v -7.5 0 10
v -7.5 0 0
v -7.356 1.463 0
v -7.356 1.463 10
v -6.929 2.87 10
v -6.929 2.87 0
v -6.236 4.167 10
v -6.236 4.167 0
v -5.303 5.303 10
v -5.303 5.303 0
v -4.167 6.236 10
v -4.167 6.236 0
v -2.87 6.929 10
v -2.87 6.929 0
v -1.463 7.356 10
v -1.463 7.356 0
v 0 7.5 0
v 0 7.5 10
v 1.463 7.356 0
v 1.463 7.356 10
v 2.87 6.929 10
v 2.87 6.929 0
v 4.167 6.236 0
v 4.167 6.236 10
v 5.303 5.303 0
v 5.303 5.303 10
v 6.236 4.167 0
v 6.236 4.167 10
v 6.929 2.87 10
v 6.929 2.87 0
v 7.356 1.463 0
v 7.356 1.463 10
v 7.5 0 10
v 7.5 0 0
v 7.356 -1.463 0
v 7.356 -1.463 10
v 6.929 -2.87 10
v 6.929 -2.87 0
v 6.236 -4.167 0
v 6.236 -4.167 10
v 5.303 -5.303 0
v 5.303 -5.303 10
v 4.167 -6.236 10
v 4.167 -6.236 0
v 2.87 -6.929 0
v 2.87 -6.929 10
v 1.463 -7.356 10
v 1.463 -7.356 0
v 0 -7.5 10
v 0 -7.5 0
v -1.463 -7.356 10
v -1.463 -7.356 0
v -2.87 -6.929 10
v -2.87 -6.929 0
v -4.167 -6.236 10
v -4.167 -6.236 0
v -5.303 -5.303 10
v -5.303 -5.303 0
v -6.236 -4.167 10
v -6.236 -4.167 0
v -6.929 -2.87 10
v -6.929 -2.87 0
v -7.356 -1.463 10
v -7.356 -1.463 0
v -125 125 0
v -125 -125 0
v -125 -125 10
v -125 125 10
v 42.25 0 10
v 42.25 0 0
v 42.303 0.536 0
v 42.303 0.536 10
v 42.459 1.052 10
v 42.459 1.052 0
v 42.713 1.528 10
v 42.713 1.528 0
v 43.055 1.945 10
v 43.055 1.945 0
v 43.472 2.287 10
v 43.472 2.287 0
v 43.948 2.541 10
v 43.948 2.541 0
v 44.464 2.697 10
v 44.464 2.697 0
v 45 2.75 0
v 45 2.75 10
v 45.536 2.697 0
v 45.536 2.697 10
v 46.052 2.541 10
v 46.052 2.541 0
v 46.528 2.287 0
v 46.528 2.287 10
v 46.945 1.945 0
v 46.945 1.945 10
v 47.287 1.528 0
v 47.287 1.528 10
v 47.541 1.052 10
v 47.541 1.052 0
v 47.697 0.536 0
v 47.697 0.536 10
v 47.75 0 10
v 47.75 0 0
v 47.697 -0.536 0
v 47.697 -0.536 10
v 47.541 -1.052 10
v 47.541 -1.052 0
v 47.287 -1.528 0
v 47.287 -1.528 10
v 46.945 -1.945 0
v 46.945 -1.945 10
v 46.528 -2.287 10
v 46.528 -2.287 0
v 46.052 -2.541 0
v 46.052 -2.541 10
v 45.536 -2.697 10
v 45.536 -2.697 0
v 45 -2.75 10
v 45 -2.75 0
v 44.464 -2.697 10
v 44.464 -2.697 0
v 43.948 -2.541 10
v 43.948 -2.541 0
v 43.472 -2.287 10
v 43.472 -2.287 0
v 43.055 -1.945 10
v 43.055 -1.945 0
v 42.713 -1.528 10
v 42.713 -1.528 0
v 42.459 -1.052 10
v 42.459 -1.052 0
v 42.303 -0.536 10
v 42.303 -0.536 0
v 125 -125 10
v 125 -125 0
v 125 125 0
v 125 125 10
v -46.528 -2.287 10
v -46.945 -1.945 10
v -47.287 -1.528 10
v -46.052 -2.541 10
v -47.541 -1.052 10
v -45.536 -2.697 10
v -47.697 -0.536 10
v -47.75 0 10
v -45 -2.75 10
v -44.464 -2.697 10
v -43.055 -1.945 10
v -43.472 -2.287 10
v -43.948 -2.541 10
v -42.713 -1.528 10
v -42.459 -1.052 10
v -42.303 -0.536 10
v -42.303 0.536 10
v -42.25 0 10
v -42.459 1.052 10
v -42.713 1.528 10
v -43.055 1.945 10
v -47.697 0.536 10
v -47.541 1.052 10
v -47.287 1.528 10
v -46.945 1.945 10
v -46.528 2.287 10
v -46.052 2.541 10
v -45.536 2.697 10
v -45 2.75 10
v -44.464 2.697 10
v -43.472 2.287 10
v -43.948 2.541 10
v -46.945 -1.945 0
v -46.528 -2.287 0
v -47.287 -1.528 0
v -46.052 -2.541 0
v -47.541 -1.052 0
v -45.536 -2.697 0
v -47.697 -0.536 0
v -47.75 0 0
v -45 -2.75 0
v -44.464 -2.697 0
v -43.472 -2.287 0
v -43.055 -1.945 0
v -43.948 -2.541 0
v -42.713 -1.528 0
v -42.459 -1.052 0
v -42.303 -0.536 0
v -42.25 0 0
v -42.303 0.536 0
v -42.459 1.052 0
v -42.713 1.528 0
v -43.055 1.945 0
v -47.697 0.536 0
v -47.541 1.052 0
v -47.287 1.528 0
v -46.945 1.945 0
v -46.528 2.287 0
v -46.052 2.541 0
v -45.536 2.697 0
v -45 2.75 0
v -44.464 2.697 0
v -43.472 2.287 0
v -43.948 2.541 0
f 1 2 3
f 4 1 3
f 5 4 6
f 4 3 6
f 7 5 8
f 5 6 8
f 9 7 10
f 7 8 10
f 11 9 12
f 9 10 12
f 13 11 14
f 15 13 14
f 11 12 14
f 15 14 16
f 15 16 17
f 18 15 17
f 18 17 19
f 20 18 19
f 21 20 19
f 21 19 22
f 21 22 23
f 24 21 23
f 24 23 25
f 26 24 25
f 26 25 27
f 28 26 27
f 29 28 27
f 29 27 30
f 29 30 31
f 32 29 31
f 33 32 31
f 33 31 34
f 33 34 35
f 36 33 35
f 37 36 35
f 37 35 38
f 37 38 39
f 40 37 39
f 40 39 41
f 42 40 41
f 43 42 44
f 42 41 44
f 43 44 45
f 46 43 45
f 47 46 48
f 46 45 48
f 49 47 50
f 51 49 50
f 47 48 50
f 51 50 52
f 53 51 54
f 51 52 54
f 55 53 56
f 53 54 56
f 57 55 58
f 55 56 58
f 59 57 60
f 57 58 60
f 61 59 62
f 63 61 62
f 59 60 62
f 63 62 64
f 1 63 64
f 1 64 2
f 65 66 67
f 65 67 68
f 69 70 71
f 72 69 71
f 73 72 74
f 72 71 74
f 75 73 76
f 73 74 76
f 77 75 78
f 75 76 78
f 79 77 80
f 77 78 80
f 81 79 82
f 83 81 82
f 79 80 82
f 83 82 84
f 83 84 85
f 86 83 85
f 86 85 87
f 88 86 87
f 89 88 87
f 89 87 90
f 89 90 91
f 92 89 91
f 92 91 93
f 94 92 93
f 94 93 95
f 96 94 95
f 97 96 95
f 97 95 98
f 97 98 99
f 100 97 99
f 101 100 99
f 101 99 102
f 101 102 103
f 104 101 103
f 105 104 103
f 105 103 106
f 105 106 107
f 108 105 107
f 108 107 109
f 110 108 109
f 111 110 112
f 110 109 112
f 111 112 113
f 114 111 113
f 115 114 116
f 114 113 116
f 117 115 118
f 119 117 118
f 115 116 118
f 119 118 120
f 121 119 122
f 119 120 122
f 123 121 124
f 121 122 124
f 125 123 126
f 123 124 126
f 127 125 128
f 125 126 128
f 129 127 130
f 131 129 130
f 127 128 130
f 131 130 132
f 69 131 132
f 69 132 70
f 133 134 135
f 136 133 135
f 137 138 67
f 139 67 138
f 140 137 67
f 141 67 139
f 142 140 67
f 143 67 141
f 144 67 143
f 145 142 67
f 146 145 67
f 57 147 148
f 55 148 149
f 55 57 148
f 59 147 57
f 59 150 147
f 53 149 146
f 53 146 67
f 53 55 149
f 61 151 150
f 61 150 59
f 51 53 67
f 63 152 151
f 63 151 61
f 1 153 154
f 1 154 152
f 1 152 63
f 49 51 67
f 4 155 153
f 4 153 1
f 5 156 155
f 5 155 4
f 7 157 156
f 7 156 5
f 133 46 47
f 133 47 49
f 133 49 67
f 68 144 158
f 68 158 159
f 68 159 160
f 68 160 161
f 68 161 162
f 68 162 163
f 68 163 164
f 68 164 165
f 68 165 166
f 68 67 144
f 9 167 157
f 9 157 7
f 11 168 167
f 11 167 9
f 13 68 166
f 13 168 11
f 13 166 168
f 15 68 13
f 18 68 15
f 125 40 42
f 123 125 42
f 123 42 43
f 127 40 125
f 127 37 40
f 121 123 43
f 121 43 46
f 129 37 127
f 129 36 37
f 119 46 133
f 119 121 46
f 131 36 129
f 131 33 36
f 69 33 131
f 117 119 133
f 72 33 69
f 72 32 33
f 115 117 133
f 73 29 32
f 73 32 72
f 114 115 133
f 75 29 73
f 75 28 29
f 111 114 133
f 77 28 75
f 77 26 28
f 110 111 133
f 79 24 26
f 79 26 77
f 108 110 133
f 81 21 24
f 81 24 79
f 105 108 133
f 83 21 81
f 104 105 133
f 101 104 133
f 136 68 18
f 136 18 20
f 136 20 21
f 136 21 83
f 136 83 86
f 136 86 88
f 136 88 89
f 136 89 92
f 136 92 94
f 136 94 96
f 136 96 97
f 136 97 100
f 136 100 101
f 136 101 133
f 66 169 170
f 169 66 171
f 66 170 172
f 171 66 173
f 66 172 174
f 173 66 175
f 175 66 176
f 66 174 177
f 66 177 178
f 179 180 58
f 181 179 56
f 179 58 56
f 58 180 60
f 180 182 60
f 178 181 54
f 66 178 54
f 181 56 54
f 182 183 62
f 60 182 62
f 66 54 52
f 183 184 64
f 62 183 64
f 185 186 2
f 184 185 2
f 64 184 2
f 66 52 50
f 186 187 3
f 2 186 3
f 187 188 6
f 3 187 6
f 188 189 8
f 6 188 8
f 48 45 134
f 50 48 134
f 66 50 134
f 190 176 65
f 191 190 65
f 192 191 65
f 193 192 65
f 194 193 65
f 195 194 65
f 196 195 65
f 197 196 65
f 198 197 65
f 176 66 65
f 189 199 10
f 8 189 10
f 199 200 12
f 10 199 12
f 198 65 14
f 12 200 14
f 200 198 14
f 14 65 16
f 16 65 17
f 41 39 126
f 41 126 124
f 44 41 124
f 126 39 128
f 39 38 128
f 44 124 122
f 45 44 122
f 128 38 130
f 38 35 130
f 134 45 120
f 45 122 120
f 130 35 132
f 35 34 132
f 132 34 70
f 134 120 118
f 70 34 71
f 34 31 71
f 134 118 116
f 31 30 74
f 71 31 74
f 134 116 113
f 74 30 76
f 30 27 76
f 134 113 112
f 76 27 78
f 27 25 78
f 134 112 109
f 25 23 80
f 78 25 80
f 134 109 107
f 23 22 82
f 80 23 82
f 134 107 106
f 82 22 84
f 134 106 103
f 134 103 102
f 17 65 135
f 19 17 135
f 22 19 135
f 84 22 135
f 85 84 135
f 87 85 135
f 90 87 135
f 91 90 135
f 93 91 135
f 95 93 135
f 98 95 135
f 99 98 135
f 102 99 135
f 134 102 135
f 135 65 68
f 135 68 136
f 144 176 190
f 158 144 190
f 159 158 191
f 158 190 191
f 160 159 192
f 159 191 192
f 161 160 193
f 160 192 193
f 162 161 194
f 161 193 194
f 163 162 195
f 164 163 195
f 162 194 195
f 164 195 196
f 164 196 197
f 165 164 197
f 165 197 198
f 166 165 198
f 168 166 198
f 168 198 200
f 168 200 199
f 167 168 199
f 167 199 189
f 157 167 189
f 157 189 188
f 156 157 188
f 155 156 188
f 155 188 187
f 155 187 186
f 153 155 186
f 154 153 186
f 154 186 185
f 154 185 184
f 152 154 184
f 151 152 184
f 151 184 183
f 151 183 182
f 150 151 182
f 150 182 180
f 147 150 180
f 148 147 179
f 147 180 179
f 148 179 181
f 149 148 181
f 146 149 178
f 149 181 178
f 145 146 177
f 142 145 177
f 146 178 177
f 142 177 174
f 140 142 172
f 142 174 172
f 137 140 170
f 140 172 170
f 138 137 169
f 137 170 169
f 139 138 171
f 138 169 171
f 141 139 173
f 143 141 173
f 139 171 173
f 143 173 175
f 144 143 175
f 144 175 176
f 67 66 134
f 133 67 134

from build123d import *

# Parameters (mm, degrees)
SKIZZE1_W                        = 250
SKIZZE1_H                        = 250
AUFSATZ_LINEAR_AUSTRAGEN1_DEPTH  = 10
F_5_5_5_5_DURCHMESSER_BOHRUNG1_D = 5.5
F_15_0_15_DURCHMESSER_BOHRUNG1_D = 15


with BuildPart() as part:
    # Skizze1 → Aufsatz-Linear austragen1 (new body)
    with BuildSketch(Plane.XY):
        Rectangle(SKIZZE1_W, SKIZZE1_H)
    extrude(amount=AUFSATZ_LINEAR_AUSTRAGEN1_DEPTH)

    # Ø5.5 (5.5) Durchmesser Bohrung1 (through all)
    with Locations(Plane.XY.offset(10)):
        with Locations((45, 0), (-45, 0)):
            Hole(F_5_5_5_5_DURCHMESSER_BOHRUNG1_D / 2)

    # Ø15.0 (15) Durchmesser Bohrung1 (through all)
    with Locations(Plane.XY.offset(10)):
        with Locations((0, 0)):
            Hole(F_15_0_15_DURCHMESSER_BOHRUNG1_D / 2)


solid = part.part
